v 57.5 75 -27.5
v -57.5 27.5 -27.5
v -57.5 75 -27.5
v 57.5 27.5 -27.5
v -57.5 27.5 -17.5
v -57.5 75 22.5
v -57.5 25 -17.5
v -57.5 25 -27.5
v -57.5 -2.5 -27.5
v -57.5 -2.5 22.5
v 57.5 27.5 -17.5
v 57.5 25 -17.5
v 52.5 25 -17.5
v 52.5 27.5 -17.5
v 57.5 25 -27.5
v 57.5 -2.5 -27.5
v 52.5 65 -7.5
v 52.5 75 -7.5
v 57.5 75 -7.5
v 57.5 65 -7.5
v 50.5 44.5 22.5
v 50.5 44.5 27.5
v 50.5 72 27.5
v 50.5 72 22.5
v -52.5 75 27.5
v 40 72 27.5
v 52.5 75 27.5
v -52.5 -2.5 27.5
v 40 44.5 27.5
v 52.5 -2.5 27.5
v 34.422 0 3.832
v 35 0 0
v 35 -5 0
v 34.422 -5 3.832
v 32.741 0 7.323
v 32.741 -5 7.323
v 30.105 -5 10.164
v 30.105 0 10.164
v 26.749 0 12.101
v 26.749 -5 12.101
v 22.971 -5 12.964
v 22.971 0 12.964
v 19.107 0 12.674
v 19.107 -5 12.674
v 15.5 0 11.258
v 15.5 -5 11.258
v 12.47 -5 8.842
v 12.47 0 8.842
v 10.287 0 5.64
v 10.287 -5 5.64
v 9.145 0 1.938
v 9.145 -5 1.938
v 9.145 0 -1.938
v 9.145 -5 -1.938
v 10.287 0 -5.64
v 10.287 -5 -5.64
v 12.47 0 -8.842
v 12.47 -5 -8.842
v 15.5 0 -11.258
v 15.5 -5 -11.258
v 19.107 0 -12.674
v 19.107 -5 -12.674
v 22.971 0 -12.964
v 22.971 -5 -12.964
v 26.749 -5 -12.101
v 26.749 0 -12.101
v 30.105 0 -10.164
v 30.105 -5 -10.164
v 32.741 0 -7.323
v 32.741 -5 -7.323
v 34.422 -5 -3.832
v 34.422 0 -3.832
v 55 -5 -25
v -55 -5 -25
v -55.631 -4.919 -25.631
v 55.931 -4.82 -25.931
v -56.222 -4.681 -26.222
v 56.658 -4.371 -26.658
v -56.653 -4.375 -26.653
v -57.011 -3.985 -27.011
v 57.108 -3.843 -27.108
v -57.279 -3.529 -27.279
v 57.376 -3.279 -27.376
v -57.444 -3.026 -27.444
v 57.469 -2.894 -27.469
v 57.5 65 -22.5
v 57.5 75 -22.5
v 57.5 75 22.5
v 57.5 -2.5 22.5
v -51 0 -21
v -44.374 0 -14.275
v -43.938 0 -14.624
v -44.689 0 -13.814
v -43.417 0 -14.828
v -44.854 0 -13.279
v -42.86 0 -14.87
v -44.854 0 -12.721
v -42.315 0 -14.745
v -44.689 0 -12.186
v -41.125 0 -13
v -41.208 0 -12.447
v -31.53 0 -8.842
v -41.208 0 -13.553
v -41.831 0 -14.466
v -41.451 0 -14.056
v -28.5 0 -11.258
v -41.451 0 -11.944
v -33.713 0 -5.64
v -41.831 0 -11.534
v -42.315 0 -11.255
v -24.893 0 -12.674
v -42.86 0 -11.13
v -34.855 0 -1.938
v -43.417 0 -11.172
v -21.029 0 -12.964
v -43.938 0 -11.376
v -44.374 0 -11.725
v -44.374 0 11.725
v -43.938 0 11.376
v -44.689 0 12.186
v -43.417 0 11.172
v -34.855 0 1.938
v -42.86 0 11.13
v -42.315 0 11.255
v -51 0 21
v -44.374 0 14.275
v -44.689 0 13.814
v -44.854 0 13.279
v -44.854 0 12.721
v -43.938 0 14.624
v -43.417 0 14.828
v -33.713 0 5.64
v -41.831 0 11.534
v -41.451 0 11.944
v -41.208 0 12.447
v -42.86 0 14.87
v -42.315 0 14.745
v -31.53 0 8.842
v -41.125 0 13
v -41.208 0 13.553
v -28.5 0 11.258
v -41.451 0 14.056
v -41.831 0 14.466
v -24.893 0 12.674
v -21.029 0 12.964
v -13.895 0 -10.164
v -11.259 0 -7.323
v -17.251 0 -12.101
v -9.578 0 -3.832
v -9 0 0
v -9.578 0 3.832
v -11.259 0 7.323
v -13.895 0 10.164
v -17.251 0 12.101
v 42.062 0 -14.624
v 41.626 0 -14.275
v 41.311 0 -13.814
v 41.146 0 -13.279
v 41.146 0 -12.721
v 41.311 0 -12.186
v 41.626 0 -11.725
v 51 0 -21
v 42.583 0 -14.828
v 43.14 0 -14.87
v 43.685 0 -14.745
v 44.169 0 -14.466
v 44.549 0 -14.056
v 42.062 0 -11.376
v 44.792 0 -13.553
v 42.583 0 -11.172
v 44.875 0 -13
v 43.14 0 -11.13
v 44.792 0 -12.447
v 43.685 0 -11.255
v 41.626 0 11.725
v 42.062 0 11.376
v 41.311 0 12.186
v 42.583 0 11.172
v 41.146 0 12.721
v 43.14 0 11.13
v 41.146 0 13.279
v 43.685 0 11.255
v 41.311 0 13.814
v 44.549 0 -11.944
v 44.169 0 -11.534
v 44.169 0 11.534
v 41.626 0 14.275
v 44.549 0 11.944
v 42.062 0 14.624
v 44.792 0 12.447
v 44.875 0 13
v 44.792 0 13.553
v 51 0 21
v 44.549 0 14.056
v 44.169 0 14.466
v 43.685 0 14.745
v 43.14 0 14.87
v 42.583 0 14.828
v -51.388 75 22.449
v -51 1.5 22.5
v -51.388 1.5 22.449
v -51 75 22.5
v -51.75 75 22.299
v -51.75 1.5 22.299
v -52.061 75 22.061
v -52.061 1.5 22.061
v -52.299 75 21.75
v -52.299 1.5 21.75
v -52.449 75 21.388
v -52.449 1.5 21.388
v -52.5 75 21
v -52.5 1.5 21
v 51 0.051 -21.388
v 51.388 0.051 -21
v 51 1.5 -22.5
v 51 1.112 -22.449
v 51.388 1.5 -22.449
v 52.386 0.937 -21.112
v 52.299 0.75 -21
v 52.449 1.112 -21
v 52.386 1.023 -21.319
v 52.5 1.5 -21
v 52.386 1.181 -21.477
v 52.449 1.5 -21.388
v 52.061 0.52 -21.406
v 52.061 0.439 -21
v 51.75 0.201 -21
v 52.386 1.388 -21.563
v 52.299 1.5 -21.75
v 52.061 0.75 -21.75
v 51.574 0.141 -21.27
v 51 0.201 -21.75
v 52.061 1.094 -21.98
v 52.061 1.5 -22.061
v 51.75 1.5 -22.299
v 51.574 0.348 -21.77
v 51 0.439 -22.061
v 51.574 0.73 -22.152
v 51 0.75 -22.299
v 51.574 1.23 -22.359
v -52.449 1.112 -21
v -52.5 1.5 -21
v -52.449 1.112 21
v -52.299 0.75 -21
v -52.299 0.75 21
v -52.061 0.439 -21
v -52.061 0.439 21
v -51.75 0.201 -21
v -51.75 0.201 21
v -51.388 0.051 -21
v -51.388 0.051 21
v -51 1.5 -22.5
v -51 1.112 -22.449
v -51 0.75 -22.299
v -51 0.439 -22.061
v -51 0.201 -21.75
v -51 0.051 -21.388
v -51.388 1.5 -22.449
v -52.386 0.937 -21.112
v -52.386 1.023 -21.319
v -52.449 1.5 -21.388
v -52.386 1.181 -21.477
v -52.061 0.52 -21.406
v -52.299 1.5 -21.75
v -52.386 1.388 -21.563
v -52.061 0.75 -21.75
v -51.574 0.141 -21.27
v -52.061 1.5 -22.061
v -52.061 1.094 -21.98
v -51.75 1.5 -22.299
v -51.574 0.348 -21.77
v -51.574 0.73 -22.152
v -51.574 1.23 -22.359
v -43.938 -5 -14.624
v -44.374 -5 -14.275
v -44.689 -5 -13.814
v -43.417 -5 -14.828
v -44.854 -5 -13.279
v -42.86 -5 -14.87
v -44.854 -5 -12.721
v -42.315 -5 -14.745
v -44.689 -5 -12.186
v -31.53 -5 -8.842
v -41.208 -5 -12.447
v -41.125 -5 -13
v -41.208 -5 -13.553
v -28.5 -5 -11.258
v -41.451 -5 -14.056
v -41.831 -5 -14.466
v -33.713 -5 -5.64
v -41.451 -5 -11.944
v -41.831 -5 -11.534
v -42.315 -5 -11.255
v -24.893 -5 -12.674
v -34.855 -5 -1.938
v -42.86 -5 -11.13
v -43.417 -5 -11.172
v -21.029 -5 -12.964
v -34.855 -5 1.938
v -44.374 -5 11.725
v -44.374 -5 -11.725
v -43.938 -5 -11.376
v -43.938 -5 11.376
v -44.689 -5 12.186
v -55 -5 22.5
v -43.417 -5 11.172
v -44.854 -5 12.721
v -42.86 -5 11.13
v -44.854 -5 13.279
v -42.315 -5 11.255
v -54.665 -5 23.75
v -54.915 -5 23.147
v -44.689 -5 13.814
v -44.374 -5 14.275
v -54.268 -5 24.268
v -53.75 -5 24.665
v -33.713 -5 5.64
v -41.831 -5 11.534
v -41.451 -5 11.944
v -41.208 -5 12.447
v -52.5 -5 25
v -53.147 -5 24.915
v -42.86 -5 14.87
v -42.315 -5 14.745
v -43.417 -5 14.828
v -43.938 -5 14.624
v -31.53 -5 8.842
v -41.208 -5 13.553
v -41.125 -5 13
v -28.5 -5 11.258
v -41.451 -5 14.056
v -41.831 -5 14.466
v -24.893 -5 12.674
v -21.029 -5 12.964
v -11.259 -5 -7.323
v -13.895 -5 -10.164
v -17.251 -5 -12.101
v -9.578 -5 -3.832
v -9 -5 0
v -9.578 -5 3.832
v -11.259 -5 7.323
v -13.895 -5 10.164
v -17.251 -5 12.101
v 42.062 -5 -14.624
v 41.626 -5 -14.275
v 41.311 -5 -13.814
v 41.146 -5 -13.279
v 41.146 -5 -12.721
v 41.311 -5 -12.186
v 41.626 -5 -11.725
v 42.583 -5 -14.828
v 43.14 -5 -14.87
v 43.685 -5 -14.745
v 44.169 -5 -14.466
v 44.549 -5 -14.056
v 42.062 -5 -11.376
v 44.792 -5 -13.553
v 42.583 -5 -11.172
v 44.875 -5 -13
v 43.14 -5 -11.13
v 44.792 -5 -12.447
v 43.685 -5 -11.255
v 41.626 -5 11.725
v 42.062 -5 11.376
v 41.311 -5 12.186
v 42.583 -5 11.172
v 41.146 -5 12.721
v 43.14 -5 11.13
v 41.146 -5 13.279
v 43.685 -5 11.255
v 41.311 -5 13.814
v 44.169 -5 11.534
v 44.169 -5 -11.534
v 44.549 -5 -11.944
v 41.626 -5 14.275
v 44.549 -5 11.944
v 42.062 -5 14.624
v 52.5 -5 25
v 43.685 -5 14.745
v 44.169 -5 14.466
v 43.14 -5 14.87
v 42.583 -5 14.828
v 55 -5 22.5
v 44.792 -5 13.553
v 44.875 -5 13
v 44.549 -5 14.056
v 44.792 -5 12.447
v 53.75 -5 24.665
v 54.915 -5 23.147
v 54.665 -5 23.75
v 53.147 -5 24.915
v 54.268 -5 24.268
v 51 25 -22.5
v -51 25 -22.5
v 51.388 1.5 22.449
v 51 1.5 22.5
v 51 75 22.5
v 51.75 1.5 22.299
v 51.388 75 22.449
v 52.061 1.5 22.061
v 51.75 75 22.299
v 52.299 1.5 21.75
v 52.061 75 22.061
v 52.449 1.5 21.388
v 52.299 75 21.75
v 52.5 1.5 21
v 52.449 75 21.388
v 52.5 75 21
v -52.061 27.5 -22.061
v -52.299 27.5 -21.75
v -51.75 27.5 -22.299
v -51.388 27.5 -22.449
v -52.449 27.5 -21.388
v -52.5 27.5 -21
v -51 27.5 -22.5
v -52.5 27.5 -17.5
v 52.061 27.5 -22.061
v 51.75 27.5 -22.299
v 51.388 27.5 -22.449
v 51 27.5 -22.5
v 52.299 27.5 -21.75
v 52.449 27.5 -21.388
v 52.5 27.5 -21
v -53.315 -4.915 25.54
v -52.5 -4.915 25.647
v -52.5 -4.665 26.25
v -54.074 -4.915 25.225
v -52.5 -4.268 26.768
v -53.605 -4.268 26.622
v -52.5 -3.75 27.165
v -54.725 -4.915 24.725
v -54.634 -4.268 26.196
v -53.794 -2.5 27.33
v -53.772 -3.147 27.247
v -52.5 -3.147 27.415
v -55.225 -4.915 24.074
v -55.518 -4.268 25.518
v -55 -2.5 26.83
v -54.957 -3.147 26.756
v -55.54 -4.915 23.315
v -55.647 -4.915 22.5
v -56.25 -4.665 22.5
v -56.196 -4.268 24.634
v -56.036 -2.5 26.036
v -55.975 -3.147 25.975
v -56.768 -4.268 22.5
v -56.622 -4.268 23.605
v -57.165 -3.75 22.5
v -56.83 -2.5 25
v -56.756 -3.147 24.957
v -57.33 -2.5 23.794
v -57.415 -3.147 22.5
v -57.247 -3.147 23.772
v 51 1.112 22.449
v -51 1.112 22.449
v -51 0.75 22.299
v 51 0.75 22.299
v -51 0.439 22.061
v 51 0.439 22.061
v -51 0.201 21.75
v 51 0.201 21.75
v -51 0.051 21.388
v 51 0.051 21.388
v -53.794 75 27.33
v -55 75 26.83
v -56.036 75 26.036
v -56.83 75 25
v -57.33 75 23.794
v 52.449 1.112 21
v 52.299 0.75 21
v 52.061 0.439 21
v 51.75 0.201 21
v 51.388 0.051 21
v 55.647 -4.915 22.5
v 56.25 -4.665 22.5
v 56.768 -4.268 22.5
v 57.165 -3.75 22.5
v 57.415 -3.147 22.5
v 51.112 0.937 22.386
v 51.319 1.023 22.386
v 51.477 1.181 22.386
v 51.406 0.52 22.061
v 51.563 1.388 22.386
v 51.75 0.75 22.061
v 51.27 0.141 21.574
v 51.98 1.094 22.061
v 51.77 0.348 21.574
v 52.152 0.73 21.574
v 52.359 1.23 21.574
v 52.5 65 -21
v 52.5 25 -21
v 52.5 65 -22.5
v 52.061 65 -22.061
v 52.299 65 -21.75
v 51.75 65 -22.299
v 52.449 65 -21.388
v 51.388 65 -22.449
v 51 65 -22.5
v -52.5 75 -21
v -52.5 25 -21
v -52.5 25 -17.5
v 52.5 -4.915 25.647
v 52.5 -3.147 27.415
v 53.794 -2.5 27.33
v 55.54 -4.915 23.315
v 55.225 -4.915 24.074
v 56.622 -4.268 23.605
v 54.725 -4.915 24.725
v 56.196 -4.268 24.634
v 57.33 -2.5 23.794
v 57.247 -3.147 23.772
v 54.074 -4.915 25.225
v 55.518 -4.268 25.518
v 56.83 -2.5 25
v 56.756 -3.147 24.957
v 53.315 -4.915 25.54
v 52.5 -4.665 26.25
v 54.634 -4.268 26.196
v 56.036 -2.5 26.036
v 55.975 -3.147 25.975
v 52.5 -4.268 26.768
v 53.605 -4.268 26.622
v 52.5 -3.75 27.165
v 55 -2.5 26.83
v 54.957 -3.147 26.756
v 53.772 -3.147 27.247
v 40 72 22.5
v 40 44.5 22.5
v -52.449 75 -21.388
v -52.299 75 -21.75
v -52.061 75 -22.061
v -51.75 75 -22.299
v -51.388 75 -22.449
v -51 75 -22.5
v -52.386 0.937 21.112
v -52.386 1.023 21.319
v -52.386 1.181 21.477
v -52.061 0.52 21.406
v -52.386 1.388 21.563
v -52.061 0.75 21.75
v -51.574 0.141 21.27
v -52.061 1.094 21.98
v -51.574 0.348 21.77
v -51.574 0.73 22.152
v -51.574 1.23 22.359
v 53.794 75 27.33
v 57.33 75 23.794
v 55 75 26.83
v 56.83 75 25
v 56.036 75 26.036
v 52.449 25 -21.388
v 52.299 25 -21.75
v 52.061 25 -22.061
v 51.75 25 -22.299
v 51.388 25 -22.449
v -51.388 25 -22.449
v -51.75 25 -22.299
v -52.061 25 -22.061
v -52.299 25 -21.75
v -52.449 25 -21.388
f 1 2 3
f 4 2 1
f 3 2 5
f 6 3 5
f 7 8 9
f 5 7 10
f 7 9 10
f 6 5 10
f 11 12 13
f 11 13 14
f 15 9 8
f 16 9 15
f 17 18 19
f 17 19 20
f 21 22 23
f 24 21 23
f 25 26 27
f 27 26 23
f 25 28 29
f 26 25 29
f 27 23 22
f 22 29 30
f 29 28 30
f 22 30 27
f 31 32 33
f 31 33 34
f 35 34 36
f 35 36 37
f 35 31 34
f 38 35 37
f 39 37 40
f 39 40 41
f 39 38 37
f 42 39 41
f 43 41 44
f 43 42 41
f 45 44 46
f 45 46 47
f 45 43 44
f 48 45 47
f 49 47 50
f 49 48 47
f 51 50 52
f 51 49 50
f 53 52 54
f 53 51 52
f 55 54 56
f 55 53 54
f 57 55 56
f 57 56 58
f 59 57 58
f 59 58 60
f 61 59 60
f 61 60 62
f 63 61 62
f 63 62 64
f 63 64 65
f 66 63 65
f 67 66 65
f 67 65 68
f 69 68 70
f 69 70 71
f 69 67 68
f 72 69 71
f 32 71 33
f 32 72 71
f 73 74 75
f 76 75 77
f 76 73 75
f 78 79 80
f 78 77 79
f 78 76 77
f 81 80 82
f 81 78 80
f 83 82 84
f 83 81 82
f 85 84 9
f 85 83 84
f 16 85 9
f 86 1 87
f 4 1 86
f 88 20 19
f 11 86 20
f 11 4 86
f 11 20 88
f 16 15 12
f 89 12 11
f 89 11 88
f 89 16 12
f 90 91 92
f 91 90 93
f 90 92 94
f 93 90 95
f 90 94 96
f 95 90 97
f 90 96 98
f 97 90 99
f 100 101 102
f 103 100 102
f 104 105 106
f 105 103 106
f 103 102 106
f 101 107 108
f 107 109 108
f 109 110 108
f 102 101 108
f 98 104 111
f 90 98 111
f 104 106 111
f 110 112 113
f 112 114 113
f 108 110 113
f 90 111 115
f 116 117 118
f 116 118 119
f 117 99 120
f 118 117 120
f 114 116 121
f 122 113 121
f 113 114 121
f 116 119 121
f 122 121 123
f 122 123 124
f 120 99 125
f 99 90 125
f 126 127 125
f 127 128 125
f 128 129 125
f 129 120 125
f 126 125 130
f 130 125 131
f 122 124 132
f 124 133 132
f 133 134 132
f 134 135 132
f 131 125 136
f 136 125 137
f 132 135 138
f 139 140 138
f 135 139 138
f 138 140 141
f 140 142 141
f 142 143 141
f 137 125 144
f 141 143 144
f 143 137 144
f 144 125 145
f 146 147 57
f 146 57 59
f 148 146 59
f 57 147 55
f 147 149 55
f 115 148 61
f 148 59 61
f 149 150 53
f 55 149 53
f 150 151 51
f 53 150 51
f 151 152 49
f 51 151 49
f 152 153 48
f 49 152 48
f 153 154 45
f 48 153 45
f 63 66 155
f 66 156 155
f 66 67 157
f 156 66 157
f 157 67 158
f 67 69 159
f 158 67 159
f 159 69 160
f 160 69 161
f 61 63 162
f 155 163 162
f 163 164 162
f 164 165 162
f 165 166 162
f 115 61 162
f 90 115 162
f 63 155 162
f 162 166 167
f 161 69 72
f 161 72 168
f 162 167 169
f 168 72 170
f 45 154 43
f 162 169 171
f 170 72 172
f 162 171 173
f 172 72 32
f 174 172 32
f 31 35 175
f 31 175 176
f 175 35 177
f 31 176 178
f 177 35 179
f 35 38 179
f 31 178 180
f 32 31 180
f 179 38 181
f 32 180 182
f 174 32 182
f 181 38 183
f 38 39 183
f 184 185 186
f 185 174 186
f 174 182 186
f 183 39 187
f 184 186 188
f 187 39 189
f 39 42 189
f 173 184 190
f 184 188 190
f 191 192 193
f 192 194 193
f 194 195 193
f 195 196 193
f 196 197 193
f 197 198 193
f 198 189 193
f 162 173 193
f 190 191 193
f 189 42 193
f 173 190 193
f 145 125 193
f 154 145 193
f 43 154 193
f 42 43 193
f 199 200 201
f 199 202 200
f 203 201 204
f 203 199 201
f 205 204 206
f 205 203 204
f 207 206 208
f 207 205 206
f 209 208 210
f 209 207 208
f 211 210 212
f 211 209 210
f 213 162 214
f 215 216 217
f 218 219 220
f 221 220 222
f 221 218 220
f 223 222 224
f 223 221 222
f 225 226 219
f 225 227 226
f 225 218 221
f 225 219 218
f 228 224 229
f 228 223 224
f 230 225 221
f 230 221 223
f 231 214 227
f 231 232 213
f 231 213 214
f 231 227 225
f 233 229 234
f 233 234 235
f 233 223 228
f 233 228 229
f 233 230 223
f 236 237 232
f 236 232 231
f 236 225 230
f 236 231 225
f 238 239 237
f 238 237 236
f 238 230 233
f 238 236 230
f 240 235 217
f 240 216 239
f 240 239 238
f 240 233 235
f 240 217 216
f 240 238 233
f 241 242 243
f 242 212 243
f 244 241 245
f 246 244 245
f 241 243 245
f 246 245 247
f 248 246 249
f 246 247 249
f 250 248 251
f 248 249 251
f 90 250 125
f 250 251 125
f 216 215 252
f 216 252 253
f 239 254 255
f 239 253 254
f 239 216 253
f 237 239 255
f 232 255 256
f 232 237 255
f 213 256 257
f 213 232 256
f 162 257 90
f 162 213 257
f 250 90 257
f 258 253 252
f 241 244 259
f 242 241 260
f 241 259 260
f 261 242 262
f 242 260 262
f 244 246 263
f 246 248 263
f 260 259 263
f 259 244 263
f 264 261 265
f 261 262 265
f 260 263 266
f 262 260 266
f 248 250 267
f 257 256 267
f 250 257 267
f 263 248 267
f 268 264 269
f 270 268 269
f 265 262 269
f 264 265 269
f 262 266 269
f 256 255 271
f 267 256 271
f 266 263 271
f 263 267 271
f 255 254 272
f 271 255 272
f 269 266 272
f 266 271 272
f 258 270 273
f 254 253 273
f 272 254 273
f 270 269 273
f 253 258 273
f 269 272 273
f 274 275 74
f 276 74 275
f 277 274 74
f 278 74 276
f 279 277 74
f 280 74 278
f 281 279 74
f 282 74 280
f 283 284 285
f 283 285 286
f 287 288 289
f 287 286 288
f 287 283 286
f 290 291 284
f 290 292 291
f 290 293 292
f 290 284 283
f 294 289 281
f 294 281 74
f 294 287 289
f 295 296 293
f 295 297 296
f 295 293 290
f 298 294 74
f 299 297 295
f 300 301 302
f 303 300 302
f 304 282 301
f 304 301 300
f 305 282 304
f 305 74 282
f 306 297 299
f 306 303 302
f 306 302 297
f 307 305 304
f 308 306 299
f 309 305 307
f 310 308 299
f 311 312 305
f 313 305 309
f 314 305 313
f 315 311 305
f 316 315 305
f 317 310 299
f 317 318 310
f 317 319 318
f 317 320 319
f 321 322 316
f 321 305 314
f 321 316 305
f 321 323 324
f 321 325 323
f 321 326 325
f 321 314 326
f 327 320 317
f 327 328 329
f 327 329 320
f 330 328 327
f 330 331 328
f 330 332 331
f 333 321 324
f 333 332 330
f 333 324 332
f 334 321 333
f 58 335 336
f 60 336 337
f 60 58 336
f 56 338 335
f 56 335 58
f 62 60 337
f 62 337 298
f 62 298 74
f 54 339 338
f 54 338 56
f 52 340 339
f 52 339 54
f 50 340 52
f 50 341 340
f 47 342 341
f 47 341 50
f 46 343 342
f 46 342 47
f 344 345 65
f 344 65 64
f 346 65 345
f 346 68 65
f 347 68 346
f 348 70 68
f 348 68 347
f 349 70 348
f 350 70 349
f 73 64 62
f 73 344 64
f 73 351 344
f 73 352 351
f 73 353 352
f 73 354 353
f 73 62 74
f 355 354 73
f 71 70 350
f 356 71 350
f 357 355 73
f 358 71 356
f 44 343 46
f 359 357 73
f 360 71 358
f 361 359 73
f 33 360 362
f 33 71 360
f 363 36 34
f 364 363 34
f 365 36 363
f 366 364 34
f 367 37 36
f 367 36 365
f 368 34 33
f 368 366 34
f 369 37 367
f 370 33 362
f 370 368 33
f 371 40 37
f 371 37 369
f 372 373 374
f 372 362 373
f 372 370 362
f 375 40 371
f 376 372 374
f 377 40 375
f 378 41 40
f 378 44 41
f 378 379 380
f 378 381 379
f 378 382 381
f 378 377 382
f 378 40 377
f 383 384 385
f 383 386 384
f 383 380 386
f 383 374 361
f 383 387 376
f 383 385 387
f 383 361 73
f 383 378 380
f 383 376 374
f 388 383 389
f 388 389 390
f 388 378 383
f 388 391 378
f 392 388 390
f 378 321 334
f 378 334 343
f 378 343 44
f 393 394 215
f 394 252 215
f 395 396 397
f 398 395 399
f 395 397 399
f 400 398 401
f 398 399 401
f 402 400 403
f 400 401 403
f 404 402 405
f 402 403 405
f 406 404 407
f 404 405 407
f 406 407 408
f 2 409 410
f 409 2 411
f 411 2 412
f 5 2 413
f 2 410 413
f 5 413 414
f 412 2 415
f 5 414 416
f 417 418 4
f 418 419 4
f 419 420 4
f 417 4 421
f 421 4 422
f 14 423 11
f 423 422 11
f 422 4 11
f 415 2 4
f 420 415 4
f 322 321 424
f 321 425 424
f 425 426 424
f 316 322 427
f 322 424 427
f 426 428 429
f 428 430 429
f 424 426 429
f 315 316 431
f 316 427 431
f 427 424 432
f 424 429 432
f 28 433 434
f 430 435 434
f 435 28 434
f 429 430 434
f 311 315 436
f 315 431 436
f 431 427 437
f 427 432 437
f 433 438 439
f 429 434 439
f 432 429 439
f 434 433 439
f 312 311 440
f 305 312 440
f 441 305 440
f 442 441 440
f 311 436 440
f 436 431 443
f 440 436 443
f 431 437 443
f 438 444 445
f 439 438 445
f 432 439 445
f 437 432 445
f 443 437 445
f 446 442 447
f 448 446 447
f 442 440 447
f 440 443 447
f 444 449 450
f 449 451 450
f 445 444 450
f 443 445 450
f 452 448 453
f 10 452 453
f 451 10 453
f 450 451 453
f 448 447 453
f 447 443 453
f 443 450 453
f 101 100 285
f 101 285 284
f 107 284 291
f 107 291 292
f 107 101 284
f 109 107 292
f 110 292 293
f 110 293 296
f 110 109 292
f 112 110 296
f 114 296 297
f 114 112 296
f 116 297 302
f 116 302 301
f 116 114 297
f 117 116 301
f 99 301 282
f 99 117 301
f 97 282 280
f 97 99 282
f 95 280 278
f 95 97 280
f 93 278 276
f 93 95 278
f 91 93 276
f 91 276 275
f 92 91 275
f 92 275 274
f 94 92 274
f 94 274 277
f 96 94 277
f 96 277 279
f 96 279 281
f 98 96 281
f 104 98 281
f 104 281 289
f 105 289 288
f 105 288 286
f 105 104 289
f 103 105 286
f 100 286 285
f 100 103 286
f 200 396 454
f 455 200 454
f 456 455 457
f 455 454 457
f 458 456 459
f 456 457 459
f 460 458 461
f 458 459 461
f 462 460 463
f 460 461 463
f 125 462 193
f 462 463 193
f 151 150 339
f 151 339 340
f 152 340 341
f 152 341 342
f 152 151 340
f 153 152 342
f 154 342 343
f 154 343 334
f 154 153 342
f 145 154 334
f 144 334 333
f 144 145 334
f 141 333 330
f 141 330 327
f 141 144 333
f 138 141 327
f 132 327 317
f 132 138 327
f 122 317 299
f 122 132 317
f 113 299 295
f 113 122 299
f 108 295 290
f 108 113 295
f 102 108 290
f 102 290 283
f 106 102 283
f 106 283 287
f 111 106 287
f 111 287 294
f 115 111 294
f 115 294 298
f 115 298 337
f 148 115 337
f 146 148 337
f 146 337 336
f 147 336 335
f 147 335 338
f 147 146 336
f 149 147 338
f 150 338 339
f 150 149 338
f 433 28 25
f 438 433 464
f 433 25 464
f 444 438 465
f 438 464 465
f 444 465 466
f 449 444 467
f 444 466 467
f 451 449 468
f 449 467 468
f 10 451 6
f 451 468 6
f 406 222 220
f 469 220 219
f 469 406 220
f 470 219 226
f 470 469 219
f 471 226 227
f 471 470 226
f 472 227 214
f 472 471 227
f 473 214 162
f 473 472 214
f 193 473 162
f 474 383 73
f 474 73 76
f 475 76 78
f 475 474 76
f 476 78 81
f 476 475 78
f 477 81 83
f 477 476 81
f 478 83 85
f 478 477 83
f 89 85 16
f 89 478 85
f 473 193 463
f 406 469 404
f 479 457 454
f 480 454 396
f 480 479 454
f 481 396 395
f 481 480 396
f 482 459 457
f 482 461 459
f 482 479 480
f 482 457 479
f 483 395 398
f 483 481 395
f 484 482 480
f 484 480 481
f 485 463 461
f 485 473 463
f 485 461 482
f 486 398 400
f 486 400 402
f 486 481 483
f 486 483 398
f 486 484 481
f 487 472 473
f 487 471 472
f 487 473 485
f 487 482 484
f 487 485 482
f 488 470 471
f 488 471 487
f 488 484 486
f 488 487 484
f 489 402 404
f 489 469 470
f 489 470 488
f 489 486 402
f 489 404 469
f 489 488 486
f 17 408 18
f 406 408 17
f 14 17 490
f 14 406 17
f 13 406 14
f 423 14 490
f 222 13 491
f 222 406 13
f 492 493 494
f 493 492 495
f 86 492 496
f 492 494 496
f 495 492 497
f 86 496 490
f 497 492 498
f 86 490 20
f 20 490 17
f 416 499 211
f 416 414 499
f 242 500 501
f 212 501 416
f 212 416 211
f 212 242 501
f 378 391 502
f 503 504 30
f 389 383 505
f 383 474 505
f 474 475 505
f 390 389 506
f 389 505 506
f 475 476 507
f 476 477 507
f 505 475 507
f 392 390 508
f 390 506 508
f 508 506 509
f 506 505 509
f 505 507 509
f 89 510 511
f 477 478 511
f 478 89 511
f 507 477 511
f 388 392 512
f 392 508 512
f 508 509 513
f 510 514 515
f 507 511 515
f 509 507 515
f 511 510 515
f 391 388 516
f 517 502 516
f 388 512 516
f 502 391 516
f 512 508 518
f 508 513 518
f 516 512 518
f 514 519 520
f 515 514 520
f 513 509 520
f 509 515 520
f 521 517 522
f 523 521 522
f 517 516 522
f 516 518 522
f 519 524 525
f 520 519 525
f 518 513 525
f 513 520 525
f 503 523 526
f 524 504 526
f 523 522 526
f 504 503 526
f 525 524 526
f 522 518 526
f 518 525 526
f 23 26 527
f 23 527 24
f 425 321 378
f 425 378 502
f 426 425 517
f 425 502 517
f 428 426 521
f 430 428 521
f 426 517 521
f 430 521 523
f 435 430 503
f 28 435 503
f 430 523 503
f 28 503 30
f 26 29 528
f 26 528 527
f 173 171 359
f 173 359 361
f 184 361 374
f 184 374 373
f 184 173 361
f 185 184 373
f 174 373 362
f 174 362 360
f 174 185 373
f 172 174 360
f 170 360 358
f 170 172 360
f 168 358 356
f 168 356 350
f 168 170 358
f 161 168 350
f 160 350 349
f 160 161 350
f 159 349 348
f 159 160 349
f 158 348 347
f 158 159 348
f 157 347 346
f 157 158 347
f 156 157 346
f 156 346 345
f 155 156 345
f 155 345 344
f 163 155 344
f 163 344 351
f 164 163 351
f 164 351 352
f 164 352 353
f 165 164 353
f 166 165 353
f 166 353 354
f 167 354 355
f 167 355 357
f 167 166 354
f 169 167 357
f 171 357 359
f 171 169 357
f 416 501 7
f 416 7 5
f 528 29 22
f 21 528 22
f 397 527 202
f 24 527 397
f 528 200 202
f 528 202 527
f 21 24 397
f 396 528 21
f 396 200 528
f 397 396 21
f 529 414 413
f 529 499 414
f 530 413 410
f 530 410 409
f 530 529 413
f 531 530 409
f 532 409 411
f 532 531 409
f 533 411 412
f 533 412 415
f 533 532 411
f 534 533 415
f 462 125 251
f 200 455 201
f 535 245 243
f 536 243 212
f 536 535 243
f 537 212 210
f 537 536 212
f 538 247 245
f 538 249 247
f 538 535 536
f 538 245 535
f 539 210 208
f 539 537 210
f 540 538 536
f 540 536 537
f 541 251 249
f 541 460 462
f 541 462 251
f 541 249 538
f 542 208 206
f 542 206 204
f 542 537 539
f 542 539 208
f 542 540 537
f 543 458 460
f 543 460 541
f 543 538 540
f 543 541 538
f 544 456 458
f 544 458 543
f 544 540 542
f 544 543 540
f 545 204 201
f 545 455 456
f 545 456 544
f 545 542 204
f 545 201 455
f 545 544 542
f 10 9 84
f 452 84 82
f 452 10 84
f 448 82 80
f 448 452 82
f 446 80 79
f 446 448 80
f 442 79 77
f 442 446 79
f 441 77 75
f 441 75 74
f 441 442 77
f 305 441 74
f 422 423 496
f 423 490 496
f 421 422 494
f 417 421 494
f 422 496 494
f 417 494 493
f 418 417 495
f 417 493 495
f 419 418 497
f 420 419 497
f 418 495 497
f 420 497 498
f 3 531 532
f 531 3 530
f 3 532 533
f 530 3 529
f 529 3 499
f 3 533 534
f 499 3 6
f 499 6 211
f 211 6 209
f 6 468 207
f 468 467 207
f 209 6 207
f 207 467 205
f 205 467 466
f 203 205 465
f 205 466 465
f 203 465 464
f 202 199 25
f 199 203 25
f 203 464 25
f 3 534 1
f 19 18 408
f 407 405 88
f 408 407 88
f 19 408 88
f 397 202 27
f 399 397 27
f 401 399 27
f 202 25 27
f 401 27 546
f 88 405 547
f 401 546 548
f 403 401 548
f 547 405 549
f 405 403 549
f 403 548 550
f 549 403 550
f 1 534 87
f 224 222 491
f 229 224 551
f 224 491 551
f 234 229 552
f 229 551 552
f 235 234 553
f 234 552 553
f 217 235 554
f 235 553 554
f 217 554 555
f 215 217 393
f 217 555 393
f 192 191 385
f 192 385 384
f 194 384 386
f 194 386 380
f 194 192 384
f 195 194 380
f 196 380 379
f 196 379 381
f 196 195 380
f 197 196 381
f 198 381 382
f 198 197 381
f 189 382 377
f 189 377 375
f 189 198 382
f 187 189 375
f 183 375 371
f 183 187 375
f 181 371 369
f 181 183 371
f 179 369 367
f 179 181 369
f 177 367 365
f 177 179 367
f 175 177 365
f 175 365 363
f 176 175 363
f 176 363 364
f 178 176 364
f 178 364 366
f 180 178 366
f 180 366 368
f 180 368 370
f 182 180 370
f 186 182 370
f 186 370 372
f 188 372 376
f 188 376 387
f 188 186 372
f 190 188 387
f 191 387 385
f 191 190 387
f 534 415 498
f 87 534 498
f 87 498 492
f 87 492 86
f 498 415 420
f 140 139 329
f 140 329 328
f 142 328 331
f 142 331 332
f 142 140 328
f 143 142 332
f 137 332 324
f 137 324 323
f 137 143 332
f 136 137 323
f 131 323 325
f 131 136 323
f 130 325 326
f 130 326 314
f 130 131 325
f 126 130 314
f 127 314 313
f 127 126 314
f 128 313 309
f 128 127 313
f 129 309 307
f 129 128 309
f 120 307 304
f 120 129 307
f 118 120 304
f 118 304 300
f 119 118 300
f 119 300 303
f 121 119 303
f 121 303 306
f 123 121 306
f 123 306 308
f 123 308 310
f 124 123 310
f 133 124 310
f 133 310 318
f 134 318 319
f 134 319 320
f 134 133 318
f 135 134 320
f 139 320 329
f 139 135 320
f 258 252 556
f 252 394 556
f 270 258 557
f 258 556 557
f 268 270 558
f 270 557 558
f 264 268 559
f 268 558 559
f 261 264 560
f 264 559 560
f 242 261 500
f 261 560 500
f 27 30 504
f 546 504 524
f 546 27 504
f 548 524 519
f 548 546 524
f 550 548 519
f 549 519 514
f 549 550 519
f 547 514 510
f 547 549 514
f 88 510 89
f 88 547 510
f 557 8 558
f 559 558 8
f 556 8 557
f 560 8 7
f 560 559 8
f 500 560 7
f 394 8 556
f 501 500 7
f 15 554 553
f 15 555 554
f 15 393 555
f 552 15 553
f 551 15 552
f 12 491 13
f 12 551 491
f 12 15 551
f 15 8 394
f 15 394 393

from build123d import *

# Parameters (mm, degrees)
F0_W        = 105
F0_H        = 45
F0_R        = 1.875
F0_R_2      = 13
F1_DEPTH    = 5
F2_W        = 115
F2_H        = 55
F2_W_2      = 105
F2_H_2      = 4.9815587699
F3_DEPTH    = 80
F4_W        = 2.5
F4_H        = 10
F5_DEPTH    = 115.001
F6_R        = 2.5
F7_T1_DEPTH = 92.5
F7_T4_ANGLE = 90
F7_T6_ANGLE = 90
F8_W        = 10.5
F8_H        = 27.5
F9_DEPTH    = 5
F10_W       = 10
F10_H       = 15
F11_DEPTH   = 5.001
F12_R       = 1.5


# Not quite as in the source:
# - a fillet or chamfer that OpenCascade refuses, or shapes differently, is made with other operations: its cross-section is extruded or revolved along the edge and cut away or added


with BuildPart() as f1:
    # F0 (on Front) → F1 (new body)
    with BuildSketch(Plane.XZ):
        Rectangle(F0_W, F0_H)
        with Locations((-43, -13)):
            Circle(F0_R, mode=Mode.SUBTRACT)
        with Locations((43, -13)):
            Circle(F0_R, mode=Mode.SUBTRACT)
        with Locations((-22, 0)):
            Circle(F0_R_2, mode=Mode.SUBTRACT)
        with Locations((-43, 13)):
            Circle(F0_R, mode=Mode.SUBTRACT)
        with Locations((22, 0)):
            Circle(F0_R_2, mode=Mode.SUBTRACT)
        with Locations((43, 13)):
            Circle(F0_R, mode=Mode.SUBTRACT)
    extrude(amount=F1_DEPTH)

    # F2 (on face) → F3 (join)
    with BuildSketch(Plane.XZ.offset(5)):
        Rectangle(F2_W, F2_H)
        Polygon((-52.5, -22.5), (-52.5, 22.5), (52.5, 22.5), (52.5, -22.5), (52.5, -27.4815587699), (-52.5, -27.4815587699), align=None, mode=Mode.SUBTRACT)
        with Locations((0, -24.990779385)):
            Rectangle(F2_W_2, F2_H_2)
    extrude(amount=-F3_DEPTH)

    # F4 (on face) → F5 (cut, through all)
    with BuildSketch(Plane.YZ.offset(57.5)):
        with Locations((26.25, -22.5)):
            Rectangle(F4_W, F4_H)
    extrude(amount=-F5_DEPTH, mode=Mode.SUBTRACT)

    # F6
    f6_edges = [f1.edges().sort_by_distance(p)[0] for p in [
        (0, -5, 27.5),
        (-57.5, -5, 0),
        (0, -5, -27.5),
        (57.5, -5, 0),
    ]]
    fillet(f6_edges, radius=F6_R)

    # F7: fillet of radius 5 on 2 edges, made by hand

    # F7_s2 → F7_t1 (cut)
    with BuildSketch(Plane.XZ.offset(-87.5)):
        with BuildLine():
            ThreePointArc((-52.5, 27.5), (-56.0355339059, 26.0355339059), (-57.5, 22.5))
            Line((-57.5, 22.5), (-57.5, 27.5))
            Line((-57.5, 27.5), (-52.5, 27.5))
        make_face()
        with BuildLine():
            ThreePointArc((52.5, 27.5), (56.0355339059, 26.0355339059), (57.5, 22.5))
            Line((57.5, 22.5), (57.5, 27.5))
            Line((57.5, 27.5), (52.5, 27.5))
        make_face()
    extrude(amount=F7_T1_DEPTH, mode=Mode.SUBTRACT)

    # F7_s3 → F7_t4 (revolve, cut)
    with BuildSketch(Plane.XY.offset(22.5)):
        with BuildLine():
            ThreePointArc((55, -5), (56.767766953, -4.267766953), (57.5, -2.5))
            Line((57.5, -2.5), (57.5, -5))
            Line((57.5, -5), (55, -5))
        make_face()
    revolve(axis=Axis((52.5, -5, 22.5), (0, -1, 0)), revolution_arc=F7_T4_ANGLE, mode=Mode.SUBTRACT)

    # F7_s5 → F7_t6 (revolve, cut)
    with BuildSketch(Plane.YZ.offset(-52.5)):
        with BuildLine():
            ThreePointArc((-5, 25), (-4.267766953, 26.767766953), (-2.5, 27.5))
            Line((-2.5, 27.5), (-5, 27.5))
            Line((-5, 27.5), (-5, 25))
        make_face()
    revolve(axis=Axis((-52.5, -5, 22.5), (0, -1, 0)), revolution_arc=F7_T6_ANGLE, mode=Mode.SUBTRACT)

    # F8 (on face) → F9 (cut, through all)
    with BuildSketch(Plane.XY.offset(27.5)):
        with Locations((45.25, 58.25)):
            Rectangle(F8_W, F8_H)
    extrude(amount=-F9_DEPTH, mode=Mode.SUBTRACT)

    # F10 (on face) → F11 (cut, through all)
    with BuildSketch(Plane(origin=(52.5, 0, 0), x_dir=(0, -1, 0), z_dir=(-1, 0, 0))):
        with Locations((-70, -15)):
            Rectangle(F10_W, F10_H)
    extrude(amount=-F11_DEPTH, mode=Mode.SUBTRACT)

    # F12
    f12_edges = [f1.edges().sort_by_distance(p)[0] for p in [
        (0, 0, -22.5),
        (52.5, 0, 0),
        (0, 0, 22.5),
        (-52.5, 0, 0),
        (-52.5, 37.5, 22.5),
        (52.5, 37.5, 22.5),
        (52.5, 12.5, -22.5),
        (52.5, 46.25, -22.5),
        (-52.5, 12.5, -22.5),
        (-52.5, 51.25, -22.5),
    ]]
    fillet(f12_edges, radius=F12_R)


solid = f1.part
